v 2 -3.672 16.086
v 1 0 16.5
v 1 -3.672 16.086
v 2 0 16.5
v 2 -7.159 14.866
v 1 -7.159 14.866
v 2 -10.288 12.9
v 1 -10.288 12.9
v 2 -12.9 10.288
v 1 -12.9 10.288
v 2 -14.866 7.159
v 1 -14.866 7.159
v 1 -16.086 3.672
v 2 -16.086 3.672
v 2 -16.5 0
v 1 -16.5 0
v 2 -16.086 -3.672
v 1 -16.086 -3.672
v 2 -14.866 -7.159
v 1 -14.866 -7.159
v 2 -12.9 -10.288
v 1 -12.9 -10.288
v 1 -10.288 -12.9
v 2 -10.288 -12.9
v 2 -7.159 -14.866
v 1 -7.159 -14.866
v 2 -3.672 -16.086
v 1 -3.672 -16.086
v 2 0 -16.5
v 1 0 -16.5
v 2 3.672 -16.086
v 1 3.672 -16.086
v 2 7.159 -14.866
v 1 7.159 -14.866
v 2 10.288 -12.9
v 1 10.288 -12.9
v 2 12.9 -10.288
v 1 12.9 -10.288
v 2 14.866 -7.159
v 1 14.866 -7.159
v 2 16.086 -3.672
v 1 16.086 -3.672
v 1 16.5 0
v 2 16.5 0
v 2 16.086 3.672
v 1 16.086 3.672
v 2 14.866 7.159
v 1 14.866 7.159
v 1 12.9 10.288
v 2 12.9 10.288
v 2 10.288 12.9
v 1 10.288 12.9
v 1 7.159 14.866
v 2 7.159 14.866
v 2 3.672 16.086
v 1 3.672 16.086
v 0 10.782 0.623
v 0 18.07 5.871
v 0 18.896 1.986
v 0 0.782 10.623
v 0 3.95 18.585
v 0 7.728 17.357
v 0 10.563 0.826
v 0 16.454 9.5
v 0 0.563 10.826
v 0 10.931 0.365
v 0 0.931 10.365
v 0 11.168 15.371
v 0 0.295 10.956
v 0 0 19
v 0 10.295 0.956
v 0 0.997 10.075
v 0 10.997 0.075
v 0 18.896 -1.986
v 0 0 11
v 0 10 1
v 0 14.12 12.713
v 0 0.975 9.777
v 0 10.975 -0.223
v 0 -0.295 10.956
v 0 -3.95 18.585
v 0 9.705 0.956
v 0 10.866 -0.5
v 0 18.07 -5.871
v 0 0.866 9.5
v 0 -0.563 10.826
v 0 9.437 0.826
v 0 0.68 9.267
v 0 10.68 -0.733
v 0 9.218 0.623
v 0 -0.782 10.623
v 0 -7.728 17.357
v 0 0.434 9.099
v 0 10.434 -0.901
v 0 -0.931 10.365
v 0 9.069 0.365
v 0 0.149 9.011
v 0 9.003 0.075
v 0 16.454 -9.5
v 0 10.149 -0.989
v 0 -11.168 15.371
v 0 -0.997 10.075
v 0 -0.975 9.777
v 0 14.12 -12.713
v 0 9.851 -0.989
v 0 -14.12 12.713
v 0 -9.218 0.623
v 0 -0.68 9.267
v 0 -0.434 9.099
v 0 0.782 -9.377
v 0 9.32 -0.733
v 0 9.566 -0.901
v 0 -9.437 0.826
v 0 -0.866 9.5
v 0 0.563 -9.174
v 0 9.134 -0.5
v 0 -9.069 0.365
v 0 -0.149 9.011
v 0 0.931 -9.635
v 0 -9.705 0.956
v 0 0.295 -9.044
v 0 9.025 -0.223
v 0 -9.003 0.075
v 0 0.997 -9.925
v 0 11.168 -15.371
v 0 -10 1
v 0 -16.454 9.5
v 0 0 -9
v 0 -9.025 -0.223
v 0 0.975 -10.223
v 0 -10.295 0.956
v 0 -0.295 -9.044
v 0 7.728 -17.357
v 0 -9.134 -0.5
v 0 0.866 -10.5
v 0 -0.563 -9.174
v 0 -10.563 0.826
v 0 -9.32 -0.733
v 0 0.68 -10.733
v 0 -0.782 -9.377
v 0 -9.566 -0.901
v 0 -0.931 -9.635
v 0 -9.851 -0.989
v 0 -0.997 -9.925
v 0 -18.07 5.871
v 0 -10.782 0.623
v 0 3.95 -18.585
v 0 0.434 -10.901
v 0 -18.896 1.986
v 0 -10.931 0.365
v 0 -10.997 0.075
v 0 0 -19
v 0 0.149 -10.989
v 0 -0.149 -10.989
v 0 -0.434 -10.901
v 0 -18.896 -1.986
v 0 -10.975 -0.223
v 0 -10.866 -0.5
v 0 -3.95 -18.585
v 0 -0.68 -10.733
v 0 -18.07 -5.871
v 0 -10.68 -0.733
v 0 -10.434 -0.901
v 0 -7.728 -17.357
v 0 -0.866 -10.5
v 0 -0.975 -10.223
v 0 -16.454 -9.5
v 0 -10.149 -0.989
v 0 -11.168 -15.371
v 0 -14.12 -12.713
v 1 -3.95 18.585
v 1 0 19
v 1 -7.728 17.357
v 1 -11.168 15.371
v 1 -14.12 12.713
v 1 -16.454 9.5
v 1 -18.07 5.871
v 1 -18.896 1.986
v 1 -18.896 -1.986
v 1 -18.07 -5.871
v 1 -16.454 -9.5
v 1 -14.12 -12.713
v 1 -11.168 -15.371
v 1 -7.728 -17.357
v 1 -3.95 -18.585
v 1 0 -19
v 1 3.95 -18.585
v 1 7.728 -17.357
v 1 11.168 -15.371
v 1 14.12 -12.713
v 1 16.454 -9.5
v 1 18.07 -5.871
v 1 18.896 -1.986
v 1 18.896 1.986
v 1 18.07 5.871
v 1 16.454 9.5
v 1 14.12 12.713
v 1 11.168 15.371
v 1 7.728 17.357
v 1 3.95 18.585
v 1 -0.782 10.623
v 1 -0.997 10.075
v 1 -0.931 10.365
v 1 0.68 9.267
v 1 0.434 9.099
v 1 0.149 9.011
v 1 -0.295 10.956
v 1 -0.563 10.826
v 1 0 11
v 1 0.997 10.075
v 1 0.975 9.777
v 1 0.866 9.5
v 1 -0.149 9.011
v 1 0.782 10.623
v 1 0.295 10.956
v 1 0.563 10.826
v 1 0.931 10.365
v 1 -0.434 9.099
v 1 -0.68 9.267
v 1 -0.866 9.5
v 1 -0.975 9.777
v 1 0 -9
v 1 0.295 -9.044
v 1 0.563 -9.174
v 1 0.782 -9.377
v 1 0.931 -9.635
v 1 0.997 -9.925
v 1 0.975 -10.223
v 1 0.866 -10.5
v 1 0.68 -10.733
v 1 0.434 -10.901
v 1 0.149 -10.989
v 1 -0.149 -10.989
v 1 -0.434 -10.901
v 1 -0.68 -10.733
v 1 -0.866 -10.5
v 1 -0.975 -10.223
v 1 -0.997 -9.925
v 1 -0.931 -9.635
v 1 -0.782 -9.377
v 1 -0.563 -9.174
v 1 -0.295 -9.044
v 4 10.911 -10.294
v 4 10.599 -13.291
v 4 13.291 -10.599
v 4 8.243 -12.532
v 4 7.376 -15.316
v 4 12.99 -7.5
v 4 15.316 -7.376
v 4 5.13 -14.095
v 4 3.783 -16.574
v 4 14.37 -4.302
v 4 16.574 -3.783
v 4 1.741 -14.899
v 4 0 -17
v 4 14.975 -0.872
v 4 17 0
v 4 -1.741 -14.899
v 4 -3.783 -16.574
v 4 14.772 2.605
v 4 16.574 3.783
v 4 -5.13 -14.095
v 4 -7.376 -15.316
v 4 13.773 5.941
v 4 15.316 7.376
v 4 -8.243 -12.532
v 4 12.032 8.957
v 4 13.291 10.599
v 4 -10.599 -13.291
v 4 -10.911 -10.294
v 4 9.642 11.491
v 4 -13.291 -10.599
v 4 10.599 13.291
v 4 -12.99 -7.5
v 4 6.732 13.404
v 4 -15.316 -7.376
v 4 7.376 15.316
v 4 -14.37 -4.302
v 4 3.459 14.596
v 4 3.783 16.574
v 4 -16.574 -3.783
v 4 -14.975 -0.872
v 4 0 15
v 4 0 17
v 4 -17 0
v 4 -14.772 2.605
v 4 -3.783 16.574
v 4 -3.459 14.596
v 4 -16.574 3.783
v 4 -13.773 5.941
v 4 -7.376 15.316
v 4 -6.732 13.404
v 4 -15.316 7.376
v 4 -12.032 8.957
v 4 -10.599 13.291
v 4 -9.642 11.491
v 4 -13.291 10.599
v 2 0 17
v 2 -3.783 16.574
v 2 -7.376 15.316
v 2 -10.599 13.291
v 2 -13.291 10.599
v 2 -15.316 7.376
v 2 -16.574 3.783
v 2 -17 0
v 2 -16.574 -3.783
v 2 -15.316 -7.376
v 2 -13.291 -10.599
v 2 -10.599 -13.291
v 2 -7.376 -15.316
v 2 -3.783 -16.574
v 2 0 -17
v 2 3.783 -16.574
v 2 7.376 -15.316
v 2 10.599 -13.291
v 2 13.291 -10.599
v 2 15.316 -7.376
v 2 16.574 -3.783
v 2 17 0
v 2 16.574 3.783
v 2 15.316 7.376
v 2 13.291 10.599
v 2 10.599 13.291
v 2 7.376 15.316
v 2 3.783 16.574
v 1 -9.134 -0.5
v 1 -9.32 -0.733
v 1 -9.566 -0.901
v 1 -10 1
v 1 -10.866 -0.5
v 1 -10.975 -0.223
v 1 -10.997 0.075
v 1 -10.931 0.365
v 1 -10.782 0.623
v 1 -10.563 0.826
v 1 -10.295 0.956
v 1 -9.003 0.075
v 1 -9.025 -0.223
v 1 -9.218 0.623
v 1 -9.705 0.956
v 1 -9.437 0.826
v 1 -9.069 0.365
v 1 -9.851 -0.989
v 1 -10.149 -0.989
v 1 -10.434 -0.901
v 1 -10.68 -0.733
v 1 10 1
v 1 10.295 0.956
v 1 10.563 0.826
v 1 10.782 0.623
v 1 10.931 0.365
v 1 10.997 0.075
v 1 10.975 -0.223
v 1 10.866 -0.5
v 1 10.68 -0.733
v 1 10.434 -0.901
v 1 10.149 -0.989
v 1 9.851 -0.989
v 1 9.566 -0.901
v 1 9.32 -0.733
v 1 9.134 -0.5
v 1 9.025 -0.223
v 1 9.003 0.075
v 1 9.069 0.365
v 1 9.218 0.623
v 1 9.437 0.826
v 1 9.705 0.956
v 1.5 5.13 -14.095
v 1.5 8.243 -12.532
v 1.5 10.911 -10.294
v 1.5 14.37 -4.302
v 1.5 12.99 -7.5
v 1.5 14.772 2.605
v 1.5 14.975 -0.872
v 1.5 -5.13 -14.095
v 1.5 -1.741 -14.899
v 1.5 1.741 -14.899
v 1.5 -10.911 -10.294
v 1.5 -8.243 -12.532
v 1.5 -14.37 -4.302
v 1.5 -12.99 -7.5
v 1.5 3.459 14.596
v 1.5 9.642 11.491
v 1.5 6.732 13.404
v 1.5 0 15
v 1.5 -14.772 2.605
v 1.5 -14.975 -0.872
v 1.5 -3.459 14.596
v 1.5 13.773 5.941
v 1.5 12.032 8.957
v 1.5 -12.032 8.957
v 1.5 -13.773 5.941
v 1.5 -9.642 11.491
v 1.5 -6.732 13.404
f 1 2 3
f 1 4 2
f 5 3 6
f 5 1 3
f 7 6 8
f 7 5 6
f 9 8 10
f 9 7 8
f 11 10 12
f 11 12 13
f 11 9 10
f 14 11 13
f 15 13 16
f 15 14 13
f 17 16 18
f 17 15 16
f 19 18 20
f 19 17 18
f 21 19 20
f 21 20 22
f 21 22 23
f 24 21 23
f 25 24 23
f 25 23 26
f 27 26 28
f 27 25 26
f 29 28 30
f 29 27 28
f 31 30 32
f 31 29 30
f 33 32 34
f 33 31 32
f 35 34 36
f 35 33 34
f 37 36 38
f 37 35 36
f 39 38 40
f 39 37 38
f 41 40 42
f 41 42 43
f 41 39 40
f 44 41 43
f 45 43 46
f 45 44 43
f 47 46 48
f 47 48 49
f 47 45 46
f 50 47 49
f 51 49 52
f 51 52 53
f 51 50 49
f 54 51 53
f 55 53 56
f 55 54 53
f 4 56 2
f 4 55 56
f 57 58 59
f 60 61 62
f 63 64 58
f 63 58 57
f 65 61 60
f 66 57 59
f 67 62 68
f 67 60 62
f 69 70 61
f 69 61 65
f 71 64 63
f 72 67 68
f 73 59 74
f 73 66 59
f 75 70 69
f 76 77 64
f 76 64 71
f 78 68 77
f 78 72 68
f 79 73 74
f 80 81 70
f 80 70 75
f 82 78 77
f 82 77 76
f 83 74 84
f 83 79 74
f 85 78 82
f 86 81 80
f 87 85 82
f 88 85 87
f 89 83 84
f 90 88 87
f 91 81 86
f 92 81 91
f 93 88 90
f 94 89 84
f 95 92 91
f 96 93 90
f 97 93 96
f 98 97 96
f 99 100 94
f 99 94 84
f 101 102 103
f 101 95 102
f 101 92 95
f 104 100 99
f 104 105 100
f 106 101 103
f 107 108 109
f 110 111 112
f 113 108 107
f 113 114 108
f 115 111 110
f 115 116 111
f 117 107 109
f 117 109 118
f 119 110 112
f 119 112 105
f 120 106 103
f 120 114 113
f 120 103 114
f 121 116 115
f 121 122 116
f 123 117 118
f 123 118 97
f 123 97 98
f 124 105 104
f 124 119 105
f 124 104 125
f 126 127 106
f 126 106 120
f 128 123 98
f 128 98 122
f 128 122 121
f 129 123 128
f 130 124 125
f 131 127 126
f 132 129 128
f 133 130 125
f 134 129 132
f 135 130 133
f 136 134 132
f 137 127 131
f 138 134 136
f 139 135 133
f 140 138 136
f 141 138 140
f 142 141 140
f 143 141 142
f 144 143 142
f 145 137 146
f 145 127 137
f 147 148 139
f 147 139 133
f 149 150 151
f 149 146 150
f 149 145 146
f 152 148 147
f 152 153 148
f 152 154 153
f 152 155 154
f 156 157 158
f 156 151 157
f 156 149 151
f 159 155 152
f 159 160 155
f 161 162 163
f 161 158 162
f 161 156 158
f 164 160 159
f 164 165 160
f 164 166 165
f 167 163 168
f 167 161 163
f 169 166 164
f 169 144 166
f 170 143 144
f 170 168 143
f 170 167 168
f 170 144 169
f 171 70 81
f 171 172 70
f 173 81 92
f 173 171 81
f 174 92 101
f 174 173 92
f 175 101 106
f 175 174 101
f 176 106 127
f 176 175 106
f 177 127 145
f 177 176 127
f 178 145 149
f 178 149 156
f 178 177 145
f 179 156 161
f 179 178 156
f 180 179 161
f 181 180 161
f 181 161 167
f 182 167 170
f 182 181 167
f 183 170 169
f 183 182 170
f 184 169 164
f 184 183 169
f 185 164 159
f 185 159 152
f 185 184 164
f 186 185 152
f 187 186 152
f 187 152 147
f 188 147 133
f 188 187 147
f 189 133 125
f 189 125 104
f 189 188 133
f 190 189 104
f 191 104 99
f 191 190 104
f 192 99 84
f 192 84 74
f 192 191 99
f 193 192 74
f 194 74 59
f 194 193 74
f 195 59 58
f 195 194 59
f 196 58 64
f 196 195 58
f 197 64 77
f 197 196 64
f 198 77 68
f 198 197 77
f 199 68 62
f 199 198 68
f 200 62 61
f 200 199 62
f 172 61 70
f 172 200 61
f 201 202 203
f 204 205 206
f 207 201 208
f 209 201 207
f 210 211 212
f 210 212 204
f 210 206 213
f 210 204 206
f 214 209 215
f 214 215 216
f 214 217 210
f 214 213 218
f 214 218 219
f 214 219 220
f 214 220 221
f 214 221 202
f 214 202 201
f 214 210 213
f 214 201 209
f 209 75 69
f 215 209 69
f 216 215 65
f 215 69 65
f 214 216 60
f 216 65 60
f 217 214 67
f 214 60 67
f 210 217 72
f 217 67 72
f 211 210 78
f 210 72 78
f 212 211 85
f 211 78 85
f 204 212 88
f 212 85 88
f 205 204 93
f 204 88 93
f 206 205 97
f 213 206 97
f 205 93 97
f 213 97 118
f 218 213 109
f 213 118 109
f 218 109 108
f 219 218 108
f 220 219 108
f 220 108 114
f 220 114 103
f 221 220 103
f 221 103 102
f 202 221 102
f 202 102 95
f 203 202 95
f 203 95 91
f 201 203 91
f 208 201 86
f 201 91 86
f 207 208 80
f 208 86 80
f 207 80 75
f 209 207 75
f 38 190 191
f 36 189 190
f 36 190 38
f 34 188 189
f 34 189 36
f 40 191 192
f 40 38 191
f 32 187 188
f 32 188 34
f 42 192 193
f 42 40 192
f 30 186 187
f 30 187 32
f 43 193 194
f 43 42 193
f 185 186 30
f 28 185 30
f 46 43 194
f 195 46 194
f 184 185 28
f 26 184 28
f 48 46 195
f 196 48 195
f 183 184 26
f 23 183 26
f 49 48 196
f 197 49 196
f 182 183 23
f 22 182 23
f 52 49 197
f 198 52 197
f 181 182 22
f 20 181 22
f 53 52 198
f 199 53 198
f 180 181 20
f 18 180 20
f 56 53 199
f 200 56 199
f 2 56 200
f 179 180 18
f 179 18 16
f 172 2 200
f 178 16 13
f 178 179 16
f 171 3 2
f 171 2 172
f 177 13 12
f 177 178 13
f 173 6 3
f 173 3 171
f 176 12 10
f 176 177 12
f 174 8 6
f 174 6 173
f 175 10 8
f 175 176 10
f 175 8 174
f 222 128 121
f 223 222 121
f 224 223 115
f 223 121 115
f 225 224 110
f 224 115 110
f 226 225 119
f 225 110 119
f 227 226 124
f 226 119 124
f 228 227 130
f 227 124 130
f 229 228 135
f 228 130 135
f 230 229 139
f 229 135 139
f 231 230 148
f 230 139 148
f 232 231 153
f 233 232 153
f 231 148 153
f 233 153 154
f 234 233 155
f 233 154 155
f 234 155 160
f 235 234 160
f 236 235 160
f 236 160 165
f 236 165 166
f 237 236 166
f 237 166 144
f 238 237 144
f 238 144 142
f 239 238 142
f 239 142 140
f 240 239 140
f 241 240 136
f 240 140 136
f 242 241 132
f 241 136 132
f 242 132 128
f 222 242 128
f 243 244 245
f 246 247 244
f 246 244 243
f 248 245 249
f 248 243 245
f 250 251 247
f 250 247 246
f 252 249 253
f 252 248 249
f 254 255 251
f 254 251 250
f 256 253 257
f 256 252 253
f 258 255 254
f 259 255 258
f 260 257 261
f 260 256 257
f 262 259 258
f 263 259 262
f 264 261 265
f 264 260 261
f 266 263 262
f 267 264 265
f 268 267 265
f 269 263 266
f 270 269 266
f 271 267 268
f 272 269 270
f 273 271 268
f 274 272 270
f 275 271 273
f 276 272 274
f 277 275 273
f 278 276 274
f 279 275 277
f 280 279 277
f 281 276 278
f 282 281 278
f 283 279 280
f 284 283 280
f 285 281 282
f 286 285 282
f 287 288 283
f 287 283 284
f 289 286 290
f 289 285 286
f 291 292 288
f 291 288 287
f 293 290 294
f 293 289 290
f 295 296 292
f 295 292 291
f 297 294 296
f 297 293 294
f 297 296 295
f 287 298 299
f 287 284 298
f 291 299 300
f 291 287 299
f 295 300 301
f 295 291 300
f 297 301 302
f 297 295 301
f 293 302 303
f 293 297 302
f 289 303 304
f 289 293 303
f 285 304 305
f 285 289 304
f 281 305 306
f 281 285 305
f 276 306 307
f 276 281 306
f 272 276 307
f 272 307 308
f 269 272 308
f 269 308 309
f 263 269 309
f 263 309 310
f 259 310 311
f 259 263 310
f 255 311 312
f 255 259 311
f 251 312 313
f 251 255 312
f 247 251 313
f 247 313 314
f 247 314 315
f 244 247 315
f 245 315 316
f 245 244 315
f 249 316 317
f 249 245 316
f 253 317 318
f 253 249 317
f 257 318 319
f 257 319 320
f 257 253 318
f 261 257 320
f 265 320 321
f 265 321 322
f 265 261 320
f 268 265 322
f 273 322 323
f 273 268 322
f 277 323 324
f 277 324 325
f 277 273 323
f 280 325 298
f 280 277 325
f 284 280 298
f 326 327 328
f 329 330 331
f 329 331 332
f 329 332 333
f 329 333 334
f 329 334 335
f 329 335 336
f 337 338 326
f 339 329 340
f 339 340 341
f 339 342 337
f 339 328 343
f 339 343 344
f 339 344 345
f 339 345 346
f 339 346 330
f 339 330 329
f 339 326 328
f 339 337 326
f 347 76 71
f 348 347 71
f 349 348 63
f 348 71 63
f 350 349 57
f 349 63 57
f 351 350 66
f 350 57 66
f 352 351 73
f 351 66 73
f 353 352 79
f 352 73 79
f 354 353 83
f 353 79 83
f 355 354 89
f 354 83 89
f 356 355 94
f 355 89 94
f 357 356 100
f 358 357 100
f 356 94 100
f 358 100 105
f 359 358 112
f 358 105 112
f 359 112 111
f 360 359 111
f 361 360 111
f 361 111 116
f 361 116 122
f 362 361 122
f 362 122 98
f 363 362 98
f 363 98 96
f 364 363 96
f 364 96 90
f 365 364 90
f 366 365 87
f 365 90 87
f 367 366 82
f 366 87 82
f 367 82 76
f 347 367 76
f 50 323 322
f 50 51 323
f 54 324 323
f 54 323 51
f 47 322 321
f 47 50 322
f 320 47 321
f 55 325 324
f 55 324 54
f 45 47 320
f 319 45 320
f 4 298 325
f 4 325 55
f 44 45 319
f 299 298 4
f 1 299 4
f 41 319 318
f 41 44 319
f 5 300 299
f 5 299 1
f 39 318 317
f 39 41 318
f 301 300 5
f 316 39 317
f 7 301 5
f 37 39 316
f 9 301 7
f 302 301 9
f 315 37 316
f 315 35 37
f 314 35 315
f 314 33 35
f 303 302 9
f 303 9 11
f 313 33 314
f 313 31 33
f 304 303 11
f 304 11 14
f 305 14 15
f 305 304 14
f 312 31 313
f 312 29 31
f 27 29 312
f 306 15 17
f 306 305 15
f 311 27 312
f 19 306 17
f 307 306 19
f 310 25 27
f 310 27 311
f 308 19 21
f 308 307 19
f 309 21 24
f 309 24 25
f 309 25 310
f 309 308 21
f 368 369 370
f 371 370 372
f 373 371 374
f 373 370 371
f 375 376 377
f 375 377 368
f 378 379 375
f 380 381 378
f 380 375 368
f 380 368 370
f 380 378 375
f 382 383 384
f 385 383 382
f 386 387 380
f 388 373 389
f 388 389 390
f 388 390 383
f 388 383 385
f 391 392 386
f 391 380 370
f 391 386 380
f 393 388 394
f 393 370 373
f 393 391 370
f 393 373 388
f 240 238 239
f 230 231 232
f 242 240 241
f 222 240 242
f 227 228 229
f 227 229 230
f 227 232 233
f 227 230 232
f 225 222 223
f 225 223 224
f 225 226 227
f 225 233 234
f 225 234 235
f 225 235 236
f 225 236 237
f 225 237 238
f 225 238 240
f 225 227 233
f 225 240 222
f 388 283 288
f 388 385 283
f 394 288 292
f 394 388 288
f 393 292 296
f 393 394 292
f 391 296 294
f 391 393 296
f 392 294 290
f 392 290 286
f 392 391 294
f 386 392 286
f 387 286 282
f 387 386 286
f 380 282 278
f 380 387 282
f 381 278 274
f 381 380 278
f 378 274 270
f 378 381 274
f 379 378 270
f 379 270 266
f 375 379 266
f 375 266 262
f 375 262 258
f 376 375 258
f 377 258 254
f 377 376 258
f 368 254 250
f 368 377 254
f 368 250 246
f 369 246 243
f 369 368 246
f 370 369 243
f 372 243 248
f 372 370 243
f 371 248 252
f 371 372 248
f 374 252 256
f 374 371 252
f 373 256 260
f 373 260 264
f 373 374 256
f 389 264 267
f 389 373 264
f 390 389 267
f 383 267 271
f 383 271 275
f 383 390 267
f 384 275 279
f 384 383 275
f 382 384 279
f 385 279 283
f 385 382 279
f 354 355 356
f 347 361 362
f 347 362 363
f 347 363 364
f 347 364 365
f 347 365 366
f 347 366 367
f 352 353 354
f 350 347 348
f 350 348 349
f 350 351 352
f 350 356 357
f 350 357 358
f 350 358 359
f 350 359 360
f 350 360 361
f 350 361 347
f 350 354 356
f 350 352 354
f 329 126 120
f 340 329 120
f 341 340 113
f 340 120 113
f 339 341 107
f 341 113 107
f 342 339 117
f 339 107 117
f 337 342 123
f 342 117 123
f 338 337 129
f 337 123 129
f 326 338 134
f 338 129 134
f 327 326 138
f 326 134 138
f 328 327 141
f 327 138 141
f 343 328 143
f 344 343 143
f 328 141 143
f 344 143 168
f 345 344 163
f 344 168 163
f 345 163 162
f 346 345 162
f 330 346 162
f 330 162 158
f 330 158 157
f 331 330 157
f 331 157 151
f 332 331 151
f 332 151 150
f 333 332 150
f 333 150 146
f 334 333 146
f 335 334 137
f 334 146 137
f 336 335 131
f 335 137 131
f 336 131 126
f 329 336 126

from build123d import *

# Parameters (mm, degrees)
SKETCH2_R          = 1
CUT_EXTRUDE1_DEPTH = 1


with BuildPart() as part:
    # Sketch1 → Revolve1 (revolve)
    with BuildSketch(Plane.XY, mode=Mode.PRIVATE) as revolve1_sk:
        Polygon((0, 19), (1, 19), (1, 16.5), (2, 16.5), (2, 17), (4, 17), (4, 15), (1.5, 15), (1.5, 0), (0, 0), align=None)
    revolve(revolve1_sk.sketch.rotate(Axis((0, 0, 0), (1, 0, 0)), 90), axis=Axis((0, 0, 0), (1, 0, 0)))

    # Sketch2 → Cut-Extrude1 (cut)
    with BuildSketch(Plane.ZY):
        with Locations((-10, 0)):
            Circle(SKETCH2_R)
        with Locations((0, 10)):
            Circle(SKETCH2_R)
        with Locations((10, 0)):
            Circle(SKETCH2_R)
        with Locations((0, -10)):
            Circle(SKETCH2_R)
    extrude(amount=-CUT_EXTRUDE1_DEPTH, mode=Mode.SUBTRACT)


solid = part.part
